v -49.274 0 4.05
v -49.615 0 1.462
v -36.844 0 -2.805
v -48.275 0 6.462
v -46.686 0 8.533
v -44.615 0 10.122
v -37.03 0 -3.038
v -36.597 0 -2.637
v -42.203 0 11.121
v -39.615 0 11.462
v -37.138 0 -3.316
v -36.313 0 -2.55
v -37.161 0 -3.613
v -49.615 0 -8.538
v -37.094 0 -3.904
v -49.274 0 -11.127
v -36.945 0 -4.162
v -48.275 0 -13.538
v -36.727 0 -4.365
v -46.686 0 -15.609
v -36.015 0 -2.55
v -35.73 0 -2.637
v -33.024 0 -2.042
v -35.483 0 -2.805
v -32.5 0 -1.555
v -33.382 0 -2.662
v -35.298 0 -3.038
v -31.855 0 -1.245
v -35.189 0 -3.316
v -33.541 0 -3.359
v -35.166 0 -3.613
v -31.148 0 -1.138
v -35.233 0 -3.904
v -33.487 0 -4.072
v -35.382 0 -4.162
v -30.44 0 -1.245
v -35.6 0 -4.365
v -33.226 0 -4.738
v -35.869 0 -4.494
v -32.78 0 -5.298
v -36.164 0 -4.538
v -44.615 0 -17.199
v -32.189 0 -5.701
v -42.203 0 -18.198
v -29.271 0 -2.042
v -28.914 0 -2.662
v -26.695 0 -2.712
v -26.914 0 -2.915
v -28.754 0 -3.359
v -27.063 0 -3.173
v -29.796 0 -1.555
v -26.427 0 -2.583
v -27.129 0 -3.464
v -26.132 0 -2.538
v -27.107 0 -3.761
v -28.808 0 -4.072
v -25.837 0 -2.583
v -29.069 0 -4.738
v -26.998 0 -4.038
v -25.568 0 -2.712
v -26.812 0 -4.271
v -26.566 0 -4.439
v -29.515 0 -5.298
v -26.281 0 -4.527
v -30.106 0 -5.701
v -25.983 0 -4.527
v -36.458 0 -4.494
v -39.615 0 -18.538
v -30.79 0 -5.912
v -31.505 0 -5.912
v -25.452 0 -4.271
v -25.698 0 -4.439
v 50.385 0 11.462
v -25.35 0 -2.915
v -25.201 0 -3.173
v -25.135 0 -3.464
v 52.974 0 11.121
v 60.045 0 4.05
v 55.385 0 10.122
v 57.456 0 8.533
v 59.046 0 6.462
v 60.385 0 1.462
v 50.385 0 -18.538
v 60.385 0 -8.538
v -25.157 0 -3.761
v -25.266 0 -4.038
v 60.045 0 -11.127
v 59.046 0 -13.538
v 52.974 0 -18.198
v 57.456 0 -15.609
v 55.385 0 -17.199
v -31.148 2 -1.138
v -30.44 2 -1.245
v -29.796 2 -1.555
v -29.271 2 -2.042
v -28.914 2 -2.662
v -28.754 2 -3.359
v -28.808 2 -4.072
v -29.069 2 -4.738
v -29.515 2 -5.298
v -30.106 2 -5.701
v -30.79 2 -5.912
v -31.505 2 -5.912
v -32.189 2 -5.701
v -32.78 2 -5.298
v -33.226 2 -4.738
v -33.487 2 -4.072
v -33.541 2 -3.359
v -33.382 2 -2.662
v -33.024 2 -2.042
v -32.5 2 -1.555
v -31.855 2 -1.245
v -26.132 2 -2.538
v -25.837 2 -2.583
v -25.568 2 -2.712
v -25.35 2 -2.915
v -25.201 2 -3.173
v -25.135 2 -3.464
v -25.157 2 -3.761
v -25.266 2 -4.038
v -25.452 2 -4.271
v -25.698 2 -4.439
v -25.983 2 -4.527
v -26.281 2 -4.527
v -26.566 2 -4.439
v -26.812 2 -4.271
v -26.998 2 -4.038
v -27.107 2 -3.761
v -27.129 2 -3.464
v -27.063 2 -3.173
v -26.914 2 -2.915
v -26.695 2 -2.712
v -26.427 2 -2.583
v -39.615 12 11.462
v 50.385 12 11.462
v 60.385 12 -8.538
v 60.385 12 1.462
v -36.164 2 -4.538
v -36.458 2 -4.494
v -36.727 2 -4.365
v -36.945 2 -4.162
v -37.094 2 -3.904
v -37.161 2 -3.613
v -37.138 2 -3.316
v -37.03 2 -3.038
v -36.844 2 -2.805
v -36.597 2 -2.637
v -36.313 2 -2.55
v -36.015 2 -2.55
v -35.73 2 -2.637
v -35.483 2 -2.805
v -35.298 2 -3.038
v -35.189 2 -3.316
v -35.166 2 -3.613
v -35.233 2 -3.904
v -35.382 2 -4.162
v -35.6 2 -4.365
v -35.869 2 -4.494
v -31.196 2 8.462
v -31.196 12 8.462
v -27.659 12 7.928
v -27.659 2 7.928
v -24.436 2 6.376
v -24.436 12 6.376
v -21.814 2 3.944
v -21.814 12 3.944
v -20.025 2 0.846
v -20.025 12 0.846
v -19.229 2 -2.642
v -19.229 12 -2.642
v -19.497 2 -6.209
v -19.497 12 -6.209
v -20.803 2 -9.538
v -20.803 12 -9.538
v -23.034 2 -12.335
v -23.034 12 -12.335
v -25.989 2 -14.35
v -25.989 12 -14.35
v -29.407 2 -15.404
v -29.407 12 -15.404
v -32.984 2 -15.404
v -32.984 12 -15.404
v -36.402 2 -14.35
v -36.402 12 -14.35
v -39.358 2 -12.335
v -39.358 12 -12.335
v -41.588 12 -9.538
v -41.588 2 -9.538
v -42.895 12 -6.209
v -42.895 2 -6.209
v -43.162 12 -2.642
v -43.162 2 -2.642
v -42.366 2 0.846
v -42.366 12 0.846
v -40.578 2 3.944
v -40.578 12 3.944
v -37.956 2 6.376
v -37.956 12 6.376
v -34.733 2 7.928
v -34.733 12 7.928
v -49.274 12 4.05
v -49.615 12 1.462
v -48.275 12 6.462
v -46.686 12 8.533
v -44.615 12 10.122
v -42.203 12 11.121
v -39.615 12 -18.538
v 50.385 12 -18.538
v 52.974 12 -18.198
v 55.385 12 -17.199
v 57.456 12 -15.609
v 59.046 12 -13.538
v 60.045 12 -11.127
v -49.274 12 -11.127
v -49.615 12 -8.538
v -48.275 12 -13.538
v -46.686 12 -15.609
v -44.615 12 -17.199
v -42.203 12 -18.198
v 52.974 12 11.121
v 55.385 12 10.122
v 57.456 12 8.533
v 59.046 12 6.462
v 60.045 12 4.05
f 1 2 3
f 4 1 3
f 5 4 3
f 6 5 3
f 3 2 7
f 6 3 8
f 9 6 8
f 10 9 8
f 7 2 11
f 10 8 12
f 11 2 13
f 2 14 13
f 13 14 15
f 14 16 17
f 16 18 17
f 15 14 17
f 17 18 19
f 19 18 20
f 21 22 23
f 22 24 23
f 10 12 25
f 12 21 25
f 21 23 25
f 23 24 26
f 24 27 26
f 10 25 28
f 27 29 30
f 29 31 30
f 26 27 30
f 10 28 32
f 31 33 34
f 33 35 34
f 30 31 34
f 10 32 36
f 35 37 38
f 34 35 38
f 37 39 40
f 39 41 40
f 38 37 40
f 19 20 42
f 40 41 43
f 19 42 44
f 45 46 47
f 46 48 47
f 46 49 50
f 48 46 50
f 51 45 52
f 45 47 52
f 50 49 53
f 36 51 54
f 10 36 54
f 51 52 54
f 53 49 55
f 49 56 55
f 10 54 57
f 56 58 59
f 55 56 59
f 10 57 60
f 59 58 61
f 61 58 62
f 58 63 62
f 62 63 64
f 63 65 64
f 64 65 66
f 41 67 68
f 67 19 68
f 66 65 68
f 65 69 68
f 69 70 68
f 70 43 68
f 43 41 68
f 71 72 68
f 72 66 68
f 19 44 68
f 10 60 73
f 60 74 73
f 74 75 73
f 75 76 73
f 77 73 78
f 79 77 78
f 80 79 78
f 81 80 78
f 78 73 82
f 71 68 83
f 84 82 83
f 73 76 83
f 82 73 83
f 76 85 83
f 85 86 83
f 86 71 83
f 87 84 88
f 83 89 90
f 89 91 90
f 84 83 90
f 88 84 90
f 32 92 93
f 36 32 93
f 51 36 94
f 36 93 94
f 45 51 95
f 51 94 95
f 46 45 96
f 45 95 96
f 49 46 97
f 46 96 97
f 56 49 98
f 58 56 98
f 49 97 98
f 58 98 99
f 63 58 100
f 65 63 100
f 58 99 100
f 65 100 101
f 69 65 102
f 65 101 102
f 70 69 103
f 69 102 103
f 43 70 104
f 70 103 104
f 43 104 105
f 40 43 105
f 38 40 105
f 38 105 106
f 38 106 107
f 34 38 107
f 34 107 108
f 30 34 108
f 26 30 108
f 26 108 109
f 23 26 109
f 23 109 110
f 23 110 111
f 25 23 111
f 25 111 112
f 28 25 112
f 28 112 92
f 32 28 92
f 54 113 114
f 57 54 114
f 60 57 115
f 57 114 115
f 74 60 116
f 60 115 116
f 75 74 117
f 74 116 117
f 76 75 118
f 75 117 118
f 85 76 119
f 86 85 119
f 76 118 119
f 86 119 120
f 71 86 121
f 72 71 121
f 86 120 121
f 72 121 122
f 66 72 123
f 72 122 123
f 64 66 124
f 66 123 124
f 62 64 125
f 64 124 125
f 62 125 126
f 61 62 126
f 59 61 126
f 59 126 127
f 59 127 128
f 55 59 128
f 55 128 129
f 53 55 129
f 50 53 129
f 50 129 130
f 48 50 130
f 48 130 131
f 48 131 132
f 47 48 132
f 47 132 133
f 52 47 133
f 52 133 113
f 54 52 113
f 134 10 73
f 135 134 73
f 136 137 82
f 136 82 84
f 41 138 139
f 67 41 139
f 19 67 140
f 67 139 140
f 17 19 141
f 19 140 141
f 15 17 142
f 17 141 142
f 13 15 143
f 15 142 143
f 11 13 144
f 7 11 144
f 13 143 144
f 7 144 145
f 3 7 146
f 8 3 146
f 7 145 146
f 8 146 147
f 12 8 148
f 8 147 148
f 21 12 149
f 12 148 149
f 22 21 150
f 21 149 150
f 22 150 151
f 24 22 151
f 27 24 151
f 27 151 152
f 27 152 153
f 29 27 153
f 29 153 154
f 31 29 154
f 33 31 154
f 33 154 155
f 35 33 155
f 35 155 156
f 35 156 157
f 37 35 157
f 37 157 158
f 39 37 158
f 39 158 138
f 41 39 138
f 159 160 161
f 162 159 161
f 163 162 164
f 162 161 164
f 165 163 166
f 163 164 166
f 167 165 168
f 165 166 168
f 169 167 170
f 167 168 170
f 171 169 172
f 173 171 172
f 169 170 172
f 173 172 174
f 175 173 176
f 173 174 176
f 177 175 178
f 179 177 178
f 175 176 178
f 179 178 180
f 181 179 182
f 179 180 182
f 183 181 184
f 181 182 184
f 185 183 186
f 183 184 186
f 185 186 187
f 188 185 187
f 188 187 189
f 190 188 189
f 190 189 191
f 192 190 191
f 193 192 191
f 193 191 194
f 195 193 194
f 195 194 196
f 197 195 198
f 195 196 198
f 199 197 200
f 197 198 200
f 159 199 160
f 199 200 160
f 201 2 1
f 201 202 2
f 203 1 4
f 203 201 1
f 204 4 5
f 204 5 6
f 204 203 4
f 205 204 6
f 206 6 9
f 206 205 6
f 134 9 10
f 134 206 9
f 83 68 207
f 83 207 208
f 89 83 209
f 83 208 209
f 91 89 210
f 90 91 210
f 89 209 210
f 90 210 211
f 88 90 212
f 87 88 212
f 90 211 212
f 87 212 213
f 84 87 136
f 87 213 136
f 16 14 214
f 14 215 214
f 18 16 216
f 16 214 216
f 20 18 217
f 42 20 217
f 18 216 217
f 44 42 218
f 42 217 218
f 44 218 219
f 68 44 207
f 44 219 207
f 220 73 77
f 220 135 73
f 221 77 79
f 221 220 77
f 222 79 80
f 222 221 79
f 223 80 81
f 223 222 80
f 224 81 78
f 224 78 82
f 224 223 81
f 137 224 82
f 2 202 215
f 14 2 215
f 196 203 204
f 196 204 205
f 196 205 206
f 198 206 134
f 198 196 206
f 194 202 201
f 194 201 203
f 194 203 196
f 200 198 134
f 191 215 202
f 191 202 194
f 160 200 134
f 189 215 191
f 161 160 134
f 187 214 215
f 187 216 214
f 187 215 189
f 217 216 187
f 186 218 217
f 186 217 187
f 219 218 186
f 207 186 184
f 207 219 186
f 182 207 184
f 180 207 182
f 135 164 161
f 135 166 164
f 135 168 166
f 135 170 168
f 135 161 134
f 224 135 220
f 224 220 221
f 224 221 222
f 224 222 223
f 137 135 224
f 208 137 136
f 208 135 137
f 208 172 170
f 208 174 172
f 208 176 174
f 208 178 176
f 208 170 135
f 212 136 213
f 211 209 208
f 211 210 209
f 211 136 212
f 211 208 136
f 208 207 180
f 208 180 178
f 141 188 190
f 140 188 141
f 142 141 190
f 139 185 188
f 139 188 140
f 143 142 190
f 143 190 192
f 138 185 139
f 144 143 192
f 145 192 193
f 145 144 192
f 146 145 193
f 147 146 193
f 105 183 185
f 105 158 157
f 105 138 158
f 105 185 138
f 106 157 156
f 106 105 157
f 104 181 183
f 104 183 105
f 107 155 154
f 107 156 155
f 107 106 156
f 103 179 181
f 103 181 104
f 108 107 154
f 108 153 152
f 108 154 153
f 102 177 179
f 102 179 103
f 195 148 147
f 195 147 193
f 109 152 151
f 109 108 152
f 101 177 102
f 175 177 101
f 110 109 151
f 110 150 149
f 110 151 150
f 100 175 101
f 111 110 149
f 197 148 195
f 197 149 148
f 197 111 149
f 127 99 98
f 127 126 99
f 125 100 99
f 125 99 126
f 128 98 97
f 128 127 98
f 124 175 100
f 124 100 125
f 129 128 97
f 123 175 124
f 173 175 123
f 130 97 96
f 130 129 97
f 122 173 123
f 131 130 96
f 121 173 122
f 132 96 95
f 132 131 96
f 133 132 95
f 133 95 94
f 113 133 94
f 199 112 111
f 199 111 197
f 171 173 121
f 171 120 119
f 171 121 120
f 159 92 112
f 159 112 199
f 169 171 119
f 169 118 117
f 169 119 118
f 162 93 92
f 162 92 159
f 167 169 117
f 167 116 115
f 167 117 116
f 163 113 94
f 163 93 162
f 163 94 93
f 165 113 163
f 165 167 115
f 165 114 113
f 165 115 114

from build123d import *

# Parameters (mm, degrees)
SKETCH1_W           = 110
SKETCH1_H           = 30
BOSS_EXTRUDE1_DEPTH = 12
FILLET1_R           = 10
FILLET2_R           = 10
SKETCH9_R           = 12
CUT_EXTRUDE5_DEPTH  = 10
SKETCH10_R          = 2.4
SKETCH10_R_2        = 1
CUT_EXTRUDE6_DEPTH  = 64.95366743


with BuildPart() as part:
    # Sketch1 → Boss-Extrude1 (new body)
    with BuildSketch(Plane(origin=(0, 0, 0), x_dir=(1, 0, 0), z_dir=(0, 1, 0))):
        with Locations((5.385430756, 3.53837453)):
            Rectangle(SKETCH1_W, SKETCH1_H)
    extrude(amount=BOSS_EXTRUDE1_DEPTH)

    # Fillet1
    fillet1_edges = [part.edges().sort_by_distance(p)[0] for p in [
        (-49.614569244, 6, -18.53837453),
        (-49.614569244, 6, 11.46162547),
    ]]
    fillet(fillet1_edges, radius=FILLET1_R)

    # Fillet2
    fillet2_edges = [part.edges().sort_by_distance(p)[0] for p in [
        (60.385430756, 6, -18.53837453),
        (60.385430756, 6, 11.46162547),
    ]]
    fillet(fillet2_edges, radius=FILLET2_R)

    # Sketch9 → Cut-Extrude5 (cut)
    with BuildSketch(Plane(origin=(0, 12, 0), x_dir=(1, 0, 0), z_dir=(0, 1, 0))):
        with Locations(Location((-31.195762423, 3.53837453, 0), (0, 0, 270))):
            Circle(SKETCH9_R)
    extrude(amount=-CUT_EXTRUDE5_DEPTH, mode=Mode.SUBTRACT)

    # Sketch10 → Cut-Extrude6 (cut, through all)
    with BuildSketch(Plane(origin=(0, 2, 0), x_dir=(1, 0, 0), z_dir=(0, 1, 0))):
        with Locations(Location((-31.147671482, 3.53837453, 0), (0, 0, 270))):
            Circle(SKETCH10_R)
        with Locations(Location((-26.131792826, 3.53837453, 0), (0, 0, 270))):
            Circle(SKETCH10_R_2)
        with Locations(Location((-36.163550137, 3.53837453, 0), (0, 0, 90))):
            Circle(SKETCH10_R_2)
    extrude(amount=-CUT_EXTRUDE6_DEPTH, mode=Mode.SUBTRACT)


solid = part.part
